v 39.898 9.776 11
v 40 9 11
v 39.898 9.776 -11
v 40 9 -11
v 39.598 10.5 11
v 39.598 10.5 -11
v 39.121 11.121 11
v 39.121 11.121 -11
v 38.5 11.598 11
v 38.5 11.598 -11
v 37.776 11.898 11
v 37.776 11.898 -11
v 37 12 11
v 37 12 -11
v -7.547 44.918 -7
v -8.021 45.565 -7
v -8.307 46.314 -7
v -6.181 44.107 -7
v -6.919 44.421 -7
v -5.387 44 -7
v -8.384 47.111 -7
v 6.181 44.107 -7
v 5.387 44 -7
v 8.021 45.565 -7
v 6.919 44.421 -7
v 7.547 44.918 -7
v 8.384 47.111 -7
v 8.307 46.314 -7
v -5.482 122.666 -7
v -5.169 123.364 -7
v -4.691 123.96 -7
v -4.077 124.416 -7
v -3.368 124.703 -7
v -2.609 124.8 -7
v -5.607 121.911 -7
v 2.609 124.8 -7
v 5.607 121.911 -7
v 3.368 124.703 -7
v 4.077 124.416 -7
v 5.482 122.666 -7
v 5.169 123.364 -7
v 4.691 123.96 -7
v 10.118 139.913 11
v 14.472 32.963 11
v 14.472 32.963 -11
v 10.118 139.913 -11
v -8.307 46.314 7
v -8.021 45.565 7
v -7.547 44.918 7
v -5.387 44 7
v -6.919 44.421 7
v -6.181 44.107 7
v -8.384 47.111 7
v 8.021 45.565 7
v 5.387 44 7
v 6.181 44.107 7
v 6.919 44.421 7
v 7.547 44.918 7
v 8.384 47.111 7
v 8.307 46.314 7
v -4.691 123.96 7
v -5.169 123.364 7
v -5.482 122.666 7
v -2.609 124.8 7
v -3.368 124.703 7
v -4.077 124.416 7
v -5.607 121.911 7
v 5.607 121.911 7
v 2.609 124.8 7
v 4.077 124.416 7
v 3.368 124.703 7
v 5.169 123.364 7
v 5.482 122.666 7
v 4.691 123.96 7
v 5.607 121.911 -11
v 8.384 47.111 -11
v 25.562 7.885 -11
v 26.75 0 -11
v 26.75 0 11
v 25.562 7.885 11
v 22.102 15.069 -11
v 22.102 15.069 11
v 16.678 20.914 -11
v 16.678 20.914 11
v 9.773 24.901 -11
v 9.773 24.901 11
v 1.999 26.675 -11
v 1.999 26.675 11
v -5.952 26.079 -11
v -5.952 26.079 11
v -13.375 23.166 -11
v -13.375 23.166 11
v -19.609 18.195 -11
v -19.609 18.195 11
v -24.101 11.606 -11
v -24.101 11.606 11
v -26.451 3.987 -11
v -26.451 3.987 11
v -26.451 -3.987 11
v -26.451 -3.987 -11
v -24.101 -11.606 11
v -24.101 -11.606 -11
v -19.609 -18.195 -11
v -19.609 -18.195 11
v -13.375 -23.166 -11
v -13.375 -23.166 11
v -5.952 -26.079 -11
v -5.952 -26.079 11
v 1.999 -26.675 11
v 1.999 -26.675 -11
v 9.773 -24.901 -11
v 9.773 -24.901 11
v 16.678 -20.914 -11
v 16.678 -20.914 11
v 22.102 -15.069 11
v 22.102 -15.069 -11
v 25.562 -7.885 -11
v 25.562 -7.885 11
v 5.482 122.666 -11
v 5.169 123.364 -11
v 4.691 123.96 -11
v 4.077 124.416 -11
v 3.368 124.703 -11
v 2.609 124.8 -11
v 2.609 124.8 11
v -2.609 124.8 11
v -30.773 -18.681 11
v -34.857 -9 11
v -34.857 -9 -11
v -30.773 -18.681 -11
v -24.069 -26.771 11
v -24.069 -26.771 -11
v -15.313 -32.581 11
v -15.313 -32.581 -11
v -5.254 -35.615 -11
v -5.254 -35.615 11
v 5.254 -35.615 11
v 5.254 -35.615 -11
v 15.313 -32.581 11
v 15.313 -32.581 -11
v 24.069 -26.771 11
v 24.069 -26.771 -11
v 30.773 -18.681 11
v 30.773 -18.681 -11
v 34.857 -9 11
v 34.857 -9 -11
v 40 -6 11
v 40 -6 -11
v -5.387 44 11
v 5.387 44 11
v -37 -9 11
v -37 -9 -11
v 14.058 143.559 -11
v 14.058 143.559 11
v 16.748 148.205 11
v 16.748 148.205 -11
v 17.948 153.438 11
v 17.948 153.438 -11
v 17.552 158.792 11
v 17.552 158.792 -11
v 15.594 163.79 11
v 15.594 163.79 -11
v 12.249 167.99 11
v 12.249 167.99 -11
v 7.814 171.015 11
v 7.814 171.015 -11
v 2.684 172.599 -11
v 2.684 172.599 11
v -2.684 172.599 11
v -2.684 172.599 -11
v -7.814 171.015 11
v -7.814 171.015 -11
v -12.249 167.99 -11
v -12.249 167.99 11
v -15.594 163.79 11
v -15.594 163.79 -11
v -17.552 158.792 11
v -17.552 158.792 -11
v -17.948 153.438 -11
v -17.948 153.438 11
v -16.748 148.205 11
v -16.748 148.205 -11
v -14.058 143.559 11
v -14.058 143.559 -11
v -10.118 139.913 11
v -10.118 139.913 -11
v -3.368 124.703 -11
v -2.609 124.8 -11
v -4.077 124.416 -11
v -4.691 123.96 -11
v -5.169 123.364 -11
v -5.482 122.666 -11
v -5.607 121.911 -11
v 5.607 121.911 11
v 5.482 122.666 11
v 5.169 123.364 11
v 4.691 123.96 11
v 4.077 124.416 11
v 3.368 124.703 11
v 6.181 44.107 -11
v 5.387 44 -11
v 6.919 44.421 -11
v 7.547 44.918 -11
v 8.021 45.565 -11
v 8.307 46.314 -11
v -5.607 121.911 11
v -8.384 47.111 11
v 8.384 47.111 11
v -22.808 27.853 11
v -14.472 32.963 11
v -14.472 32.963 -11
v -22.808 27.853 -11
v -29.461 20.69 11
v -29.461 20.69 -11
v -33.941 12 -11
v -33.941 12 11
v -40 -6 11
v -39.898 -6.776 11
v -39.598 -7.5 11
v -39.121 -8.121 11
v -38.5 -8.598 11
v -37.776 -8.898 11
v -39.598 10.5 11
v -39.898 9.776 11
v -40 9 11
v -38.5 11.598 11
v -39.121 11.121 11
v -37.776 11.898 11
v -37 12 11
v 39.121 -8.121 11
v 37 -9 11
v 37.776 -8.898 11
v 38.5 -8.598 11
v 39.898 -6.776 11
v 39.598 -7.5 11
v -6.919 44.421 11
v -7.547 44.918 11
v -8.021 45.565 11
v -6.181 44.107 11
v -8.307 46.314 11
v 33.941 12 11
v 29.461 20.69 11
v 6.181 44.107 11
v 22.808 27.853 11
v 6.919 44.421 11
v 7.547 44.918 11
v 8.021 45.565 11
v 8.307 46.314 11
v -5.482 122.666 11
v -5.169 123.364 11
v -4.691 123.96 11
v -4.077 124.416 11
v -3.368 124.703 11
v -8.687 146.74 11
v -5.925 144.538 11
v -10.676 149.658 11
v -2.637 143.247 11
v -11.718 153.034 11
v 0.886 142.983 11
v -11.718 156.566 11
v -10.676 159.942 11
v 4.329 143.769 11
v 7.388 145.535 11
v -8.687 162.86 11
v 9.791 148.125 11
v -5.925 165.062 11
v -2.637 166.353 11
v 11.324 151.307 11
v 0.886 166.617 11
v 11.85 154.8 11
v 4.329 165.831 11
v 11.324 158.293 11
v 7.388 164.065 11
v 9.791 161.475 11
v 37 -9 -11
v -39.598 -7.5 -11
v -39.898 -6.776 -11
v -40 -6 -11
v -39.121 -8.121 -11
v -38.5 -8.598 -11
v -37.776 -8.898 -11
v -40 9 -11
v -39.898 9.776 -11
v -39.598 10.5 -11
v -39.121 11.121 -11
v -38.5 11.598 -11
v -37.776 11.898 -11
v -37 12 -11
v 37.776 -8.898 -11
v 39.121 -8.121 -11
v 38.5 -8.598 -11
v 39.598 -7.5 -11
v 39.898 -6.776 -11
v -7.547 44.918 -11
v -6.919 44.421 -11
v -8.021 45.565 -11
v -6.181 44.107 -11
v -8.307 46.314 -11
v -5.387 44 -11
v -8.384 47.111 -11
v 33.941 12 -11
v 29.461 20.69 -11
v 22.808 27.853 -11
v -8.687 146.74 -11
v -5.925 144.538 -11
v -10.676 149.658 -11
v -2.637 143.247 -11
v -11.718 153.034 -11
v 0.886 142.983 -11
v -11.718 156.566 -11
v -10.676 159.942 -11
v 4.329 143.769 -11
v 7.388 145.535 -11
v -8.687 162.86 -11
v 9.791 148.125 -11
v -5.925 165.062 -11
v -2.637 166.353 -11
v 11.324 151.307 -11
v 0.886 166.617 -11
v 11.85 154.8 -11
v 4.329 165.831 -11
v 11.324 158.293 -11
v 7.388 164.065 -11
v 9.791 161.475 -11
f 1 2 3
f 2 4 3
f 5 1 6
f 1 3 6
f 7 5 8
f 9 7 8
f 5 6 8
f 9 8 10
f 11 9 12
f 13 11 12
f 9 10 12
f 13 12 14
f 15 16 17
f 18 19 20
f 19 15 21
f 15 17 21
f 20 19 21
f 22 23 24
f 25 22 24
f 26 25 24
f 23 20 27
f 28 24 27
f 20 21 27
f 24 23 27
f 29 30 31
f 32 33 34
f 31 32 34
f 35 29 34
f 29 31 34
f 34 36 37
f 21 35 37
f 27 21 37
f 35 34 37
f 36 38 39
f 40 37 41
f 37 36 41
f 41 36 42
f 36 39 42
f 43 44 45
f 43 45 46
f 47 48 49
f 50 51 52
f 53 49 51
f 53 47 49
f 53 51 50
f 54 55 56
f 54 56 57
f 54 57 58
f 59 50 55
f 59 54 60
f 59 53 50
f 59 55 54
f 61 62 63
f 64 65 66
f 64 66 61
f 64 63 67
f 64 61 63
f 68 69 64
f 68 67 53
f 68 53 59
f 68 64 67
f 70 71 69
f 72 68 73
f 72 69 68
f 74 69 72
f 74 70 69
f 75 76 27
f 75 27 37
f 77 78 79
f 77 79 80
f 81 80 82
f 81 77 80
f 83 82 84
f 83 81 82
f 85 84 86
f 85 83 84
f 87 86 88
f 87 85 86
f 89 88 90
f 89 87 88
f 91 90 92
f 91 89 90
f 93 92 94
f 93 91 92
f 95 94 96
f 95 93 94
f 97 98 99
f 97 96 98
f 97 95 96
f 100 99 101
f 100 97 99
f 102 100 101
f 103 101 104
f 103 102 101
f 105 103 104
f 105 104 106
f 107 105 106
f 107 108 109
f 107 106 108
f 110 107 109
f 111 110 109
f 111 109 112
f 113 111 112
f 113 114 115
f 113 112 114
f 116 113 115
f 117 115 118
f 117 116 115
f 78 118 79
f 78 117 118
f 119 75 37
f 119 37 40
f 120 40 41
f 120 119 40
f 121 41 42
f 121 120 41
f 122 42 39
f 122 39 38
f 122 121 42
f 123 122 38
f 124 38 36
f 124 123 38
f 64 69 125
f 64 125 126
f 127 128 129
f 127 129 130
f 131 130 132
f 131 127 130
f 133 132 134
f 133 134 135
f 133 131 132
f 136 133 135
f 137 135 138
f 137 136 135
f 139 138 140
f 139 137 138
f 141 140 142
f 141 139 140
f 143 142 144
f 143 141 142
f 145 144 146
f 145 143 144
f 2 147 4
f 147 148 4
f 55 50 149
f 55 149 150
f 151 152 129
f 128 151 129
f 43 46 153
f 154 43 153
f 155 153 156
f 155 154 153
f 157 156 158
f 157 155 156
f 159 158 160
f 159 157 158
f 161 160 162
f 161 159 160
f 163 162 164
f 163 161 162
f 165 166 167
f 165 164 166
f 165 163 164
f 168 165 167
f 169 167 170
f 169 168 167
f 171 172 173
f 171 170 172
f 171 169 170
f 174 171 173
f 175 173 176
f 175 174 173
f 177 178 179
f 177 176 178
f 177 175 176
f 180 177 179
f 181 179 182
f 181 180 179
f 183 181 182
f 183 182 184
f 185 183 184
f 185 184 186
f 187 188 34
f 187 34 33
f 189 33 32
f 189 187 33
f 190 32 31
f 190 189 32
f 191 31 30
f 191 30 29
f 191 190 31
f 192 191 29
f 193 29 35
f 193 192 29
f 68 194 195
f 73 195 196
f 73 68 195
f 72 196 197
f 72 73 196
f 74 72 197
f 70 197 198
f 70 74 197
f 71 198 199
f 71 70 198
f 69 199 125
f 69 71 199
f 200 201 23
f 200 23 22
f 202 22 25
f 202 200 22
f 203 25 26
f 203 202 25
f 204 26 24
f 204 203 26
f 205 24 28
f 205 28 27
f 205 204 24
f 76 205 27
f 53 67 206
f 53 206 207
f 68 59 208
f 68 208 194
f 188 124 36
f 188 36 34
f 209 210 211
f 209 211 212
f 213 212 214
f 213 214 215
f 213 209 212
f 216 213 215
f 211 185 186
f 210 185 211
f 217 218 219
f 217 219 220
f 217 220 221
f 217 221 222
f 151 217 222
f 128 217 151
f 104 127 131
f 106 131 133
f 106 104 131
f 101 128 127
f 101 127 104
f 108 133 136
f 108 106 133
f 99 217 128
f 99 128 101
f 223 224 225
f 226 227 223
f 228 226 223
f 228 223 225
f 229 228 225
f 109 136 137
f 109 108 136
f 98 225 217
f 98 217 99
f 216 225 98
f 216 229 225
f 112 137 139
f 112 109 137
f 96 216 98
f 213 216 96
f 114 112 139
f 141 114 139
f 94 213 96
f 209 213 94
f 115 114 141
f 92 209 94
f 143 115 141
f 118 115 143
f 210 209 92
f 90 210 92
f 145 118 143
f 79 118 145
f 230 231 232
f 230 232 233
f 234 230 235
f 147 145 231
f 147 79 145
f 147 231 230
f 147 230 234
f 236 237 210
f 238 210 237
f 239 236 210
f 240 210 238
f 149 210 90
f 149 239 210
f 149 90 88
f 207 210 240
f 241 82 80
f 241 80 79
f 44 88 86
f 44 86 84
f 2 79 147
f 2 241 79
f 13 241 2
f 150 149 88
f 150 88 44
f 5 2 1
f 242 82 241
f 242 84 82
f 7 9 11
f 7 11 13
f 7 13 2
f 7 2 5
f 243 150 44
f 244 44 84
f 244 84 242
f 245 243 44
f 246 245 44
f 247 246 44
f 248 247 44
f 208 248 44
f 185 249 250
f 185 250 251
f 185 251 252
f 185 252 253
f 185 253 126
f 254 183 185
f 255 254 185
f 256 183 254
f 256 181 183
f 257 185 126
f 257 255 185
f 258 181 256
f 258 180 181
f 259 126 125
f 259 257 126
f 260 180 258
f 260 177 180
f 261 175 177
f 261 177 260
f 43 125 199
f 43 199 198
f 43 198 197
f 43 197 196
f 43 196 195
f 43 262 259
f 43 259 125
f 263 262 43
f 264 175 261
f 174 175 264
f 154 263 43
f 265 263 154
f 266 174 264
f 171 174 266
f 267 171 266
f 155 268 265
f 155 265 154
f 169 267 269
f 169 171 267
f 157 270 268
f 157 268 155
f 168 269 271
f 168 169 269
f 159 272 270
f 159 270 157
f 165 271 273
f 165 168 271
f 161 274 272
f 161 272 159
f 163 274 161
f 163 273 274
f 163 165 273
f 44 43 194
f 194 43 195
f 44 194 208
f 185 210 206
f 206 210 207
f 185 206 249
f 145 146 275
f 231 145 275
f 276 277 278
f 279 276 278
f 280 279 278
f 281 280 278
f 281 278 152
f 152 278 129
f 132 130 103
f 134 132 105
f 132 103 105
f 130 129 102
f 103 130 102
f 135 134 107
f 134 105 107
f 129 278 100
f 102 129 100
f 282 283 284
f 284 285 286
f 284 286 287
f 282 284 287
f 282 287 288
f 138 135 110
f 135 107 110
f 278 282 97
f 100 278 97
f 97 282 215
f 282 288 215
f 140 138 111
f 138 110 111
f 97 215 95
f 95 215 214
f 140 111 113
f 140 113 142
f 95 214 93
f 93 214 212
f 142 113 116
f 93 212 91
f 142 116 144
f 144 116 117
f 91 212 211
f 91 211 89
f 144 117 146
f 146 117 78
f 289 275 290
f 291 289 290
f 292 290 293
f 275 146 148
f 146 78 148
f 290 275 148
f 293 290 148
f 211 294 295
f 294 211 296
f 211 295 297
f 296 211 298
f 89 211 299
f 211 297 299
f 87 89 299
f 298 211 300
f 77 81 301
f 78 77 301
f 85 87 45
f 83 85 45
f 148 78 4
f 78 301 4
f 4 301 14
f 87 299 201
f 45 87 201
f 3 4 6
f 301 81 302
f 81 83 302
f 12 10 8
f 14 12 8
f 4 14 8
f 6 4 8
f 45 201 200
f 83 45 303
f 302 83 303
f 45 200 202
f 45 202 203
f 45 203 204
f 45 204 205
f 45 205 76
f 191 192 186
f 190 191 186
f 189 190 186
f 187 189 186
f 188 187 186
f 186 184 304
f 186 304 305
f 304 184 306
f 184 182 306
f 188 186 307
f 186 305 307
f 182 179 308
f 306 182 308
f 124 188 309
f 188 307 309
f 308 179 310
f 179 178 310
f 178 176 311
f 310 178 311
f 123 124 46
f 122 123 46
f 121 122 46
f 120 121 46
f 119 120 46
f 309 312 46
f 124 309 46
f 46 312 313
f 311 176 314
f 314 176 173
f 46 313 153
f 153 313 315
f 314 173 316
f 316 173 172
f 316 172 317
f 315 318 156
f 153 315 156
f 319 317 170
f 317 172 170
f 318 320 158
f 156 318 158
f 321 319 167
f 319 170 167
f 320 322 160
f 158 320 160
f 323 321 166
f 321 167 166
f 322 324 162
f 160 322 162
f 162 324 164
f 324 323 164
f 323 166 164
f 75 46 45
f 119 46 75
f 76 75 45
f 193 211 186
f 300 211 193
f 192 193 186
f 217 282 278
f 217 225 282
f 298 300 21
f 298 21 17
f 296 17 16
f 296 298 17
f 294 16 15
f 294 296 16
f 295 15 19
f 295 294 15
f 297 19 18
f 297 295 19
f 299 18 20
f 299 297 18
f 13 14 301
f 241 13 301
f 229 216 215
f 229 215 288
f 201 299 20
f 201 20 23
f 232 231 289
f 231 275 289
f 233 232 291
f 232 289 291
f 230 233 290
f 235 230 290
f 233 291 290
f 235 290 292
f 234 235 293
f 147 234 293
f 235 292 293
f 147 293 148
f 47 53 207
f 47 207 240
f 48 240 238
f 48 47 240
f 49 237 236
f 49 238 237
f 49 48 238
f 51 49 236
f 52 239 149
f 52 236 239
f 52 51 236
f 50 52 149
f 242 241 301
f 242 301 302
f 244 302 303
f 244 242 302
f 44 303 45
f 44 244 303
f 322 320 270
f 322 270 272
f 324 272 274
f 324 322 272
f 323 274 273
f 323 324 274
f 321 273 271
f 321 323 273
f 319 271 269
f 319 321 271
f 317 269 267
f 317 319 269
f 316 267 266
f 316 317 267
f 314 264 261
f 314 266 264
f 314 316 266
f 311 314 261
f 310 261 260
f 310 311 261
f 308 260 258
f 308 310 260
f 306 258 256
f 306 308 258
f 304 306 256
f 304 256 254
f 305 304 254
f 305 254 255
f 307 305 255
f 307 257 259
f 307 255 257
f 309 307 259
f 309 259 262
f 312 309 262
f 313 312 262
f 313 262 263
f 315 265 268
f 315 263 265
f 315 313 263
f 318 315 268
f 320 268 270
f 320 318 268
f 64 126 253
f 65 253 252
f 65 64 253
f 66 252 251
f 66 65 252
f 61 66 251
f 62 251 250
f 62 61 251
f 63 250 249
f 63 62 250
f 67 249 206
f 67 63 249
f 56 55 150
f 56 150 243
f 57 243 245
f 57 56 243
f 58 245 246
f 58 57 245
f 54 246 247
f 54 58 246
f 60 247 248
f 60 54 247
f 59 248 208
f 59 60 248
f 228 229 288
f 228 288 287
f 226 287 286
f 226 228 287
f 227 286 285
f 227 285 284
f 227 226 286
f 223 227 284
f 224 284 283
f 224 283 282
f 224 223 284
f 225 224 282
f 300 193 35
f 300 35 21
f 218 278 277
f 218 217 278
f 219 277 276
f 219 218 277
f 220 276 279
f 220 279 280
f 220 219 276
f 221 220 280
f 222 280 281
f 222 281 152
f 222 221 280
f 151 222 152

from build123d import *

# Parameters (mm, degrees)
SKETCH1_R                 = 36
BIG_END_DEPTH             = 11
SKETCH2_R                 = 18
SMALL_END_DEPTH           = 11
BEAM_DEPTH                = 11
CAP_BOLT_BOSSES_DEPTH     = 11
BEAM_START                = 7
BEAM_POCKET_FRONT_DEPTH   = 5
BEAM_START_2              = -12
BEAM_POCKET_REAR_DEPTH    = 5
BIG_END_BORE_DEPTH        = 178.709988464
BIG_END_BORE_DEPTH_BACK   = 178.709988464
SKETCH7_R                 = 26.75
SMALL_END_BORE_DEPTH      = 178.709988464
SMALL_END_BORE_DEPTH_BACK = 178.709988464
SKETCH8_R                 = 11.85


with BuildPart() as part:
    # Sketch1 → Big End (new, symmetric)
    with BuildSketch(Plane.XY):
        Circle(SKETCH1_R)
    extrude(amount=BIG_END_DEPTH, both=True)



with BuildPart() as body_2:
    # Sketch2 → Small End (new, symmetric)
    with BuildSketch(Plane.XY):
        with Locations((0, 154.8)):
            Circle(SKETCH2_R)
    extrude(amount=SMALL_END_DEPTH, both=True)


with BuildPart() as part_1:
    add(part.part)

    add(body_2.part)  # Beam merges body 2
    # Sketch3 → Beam (add, symmetric)
    with BuildSketch(Plane.XY):
        Polygon((-15, 20), (15, 20), (10, 142.8), (-10, 142.8), align=None)
    extrude(amount=BEAM_DEPTH, both=True)

    # Sketch4 → Cap Bolt Bosses (add, symmetric)
    with BuildSketch(Plane.XY):
        with BuildLine():
            Line((29, -9), (37, -9))
            ThreePointArc((37, -9), (39.121320344, -8.121320344), (40, -6))
            Line((40, -6), (40, 9))
            ThreePointArc((40, 9), (39.121320344, 11.121320344), (37, 12))
            Line((37, 12), (29, 12))
            ThreePointArc((29, 12), (26.878679656, 11.121320344), (26, 9))
            Line((26, 9), (26, -6))
            ThreePointArc((26, -6), (26.878679656, -8.121320344), (29, -9))
        make_face()
        with BuildLine():
            Line((-37, -9), (-29, -9))
            ThreePointArc((-29, -9), (-26.878679656, -8.121320344), (-26, -6))
            Line((-26, -6), (-26, 9))
            ThreePointArc((-26, 9), (-26.878679656, 11.121320344), (-29, 12))
            Line((-29, 12), (-37, 12))
            ThreePointArc((-37, 12), (-39.121320344, 11.121320344), (-40, 9))
            Line((-40, 9), (-40, -6))
            ThreePointArc((-40, -6), (-39.121320344, -8.121320344), (-37, -9))
        make_face()
    extrude(amount=CAP_BOLT_BOSSES_DEPTH, both=True)

    # Sketch5 → Beam Pocket Front (cut)
    with BuildSketch(Plane.XY.offset(BEAM_START)):
        with BuildLine():
            Line((-5.386546762, 44), (5.386546762, 44))
            ThreePointArc((5.386546762, 44), (7.546862517, 44.918405458), (8.384481085, 47.111309443))
            Line((8.384481085, 47.111309443), (5.607253362, 121.911309443))
            ThreePointArc((5.607253362, 121.911309443), (4.69091358, 123.960315756), (2.609319039, 124.8))
            Line((2.609319039, 124.8), (-2.609319039, 124.8))
            ThreePointArc((-2.609319039, 124.8), (-4.69091358, 123.960315756), (-5.607253362, 121.911309443))
            Line((-5.607253362, 121.911309443), (-8.384481085, 47.111309443))
            ThreePointArc((-8.384481085, 47.111309443), (-7.546862517, 44.918405458), (-5.386546762, 44))
        make_face()
    extrude(amount=BEAM_POCKET_FRONT_DEPTH, mode=Mode.SUBTRACT)

    # Sketch6 → Beam Pocket Rear (cut)
    with BuildSketch(Plane.XY.offset(BEAM_START_2)):
        with BuildLine():
            Line((-5.386546762, 44), (5.386546762, 44))
            ThreePointArc((5.386546762, 44), (7.546862517, 44.918405458), (8.384481085, 47.111309443))
            Line((8.384481085, 47.111309443), (5.607253362, 121.911309443))
            ThreePointArc((5.607253362, 121.911309443), (4.69091358, 123.960315756), (2.609319039, 124.8))
            Line((2.609319039, 124.8), (-2.609319039, 124.8))
            ThreePointArc((-2.609319039, 124.8), (-4.69091358, 123.960315756), (-5.607253362, 121.911309443))
            Line((-5.607253362, 121.911309443), (-8.384481085, 47.111309443))
            ThreePointArc((-8.384481085, 47.111309443), (-7.546862517, 44.918405458), (-5.386546762, 44))
        make_face()
    extrude(amount=BEAM_POCKET_REAR_DEPTH, mode=Mode.SUBTRACT)

    # Sketch7 → Big End Bore (cut, two sides: drawn at the far end of the back side and taken through both)
    with BuildSketch(Plane.XY.offset(-BIG_END_BORE_DEPTH_BACK)):
        Circle(SKETCH7_R)
    extrude(amount=BIG_END_BORE_DEPTH + BIG_END_BORE_DEPTH_BACK, mode=Mode.SUBTRACT)

    # Sketch8 → Small End Bore (cut, two sides: drawn at the far end of the back side and taken through both)
    with BuildSketch(Plane.XY.offset(-SMALL_END_BORE_DEPTH_BACK)):
        with Locations((0, 154.8)):
            Circle(SKETCH8_R)
    extrude(amount=SMALL_END_BORE_DEPTH + SMALL_END_BORE_DEPTH_BACK, mode=Mode.SUBTRACT)


solid = part_1.part
